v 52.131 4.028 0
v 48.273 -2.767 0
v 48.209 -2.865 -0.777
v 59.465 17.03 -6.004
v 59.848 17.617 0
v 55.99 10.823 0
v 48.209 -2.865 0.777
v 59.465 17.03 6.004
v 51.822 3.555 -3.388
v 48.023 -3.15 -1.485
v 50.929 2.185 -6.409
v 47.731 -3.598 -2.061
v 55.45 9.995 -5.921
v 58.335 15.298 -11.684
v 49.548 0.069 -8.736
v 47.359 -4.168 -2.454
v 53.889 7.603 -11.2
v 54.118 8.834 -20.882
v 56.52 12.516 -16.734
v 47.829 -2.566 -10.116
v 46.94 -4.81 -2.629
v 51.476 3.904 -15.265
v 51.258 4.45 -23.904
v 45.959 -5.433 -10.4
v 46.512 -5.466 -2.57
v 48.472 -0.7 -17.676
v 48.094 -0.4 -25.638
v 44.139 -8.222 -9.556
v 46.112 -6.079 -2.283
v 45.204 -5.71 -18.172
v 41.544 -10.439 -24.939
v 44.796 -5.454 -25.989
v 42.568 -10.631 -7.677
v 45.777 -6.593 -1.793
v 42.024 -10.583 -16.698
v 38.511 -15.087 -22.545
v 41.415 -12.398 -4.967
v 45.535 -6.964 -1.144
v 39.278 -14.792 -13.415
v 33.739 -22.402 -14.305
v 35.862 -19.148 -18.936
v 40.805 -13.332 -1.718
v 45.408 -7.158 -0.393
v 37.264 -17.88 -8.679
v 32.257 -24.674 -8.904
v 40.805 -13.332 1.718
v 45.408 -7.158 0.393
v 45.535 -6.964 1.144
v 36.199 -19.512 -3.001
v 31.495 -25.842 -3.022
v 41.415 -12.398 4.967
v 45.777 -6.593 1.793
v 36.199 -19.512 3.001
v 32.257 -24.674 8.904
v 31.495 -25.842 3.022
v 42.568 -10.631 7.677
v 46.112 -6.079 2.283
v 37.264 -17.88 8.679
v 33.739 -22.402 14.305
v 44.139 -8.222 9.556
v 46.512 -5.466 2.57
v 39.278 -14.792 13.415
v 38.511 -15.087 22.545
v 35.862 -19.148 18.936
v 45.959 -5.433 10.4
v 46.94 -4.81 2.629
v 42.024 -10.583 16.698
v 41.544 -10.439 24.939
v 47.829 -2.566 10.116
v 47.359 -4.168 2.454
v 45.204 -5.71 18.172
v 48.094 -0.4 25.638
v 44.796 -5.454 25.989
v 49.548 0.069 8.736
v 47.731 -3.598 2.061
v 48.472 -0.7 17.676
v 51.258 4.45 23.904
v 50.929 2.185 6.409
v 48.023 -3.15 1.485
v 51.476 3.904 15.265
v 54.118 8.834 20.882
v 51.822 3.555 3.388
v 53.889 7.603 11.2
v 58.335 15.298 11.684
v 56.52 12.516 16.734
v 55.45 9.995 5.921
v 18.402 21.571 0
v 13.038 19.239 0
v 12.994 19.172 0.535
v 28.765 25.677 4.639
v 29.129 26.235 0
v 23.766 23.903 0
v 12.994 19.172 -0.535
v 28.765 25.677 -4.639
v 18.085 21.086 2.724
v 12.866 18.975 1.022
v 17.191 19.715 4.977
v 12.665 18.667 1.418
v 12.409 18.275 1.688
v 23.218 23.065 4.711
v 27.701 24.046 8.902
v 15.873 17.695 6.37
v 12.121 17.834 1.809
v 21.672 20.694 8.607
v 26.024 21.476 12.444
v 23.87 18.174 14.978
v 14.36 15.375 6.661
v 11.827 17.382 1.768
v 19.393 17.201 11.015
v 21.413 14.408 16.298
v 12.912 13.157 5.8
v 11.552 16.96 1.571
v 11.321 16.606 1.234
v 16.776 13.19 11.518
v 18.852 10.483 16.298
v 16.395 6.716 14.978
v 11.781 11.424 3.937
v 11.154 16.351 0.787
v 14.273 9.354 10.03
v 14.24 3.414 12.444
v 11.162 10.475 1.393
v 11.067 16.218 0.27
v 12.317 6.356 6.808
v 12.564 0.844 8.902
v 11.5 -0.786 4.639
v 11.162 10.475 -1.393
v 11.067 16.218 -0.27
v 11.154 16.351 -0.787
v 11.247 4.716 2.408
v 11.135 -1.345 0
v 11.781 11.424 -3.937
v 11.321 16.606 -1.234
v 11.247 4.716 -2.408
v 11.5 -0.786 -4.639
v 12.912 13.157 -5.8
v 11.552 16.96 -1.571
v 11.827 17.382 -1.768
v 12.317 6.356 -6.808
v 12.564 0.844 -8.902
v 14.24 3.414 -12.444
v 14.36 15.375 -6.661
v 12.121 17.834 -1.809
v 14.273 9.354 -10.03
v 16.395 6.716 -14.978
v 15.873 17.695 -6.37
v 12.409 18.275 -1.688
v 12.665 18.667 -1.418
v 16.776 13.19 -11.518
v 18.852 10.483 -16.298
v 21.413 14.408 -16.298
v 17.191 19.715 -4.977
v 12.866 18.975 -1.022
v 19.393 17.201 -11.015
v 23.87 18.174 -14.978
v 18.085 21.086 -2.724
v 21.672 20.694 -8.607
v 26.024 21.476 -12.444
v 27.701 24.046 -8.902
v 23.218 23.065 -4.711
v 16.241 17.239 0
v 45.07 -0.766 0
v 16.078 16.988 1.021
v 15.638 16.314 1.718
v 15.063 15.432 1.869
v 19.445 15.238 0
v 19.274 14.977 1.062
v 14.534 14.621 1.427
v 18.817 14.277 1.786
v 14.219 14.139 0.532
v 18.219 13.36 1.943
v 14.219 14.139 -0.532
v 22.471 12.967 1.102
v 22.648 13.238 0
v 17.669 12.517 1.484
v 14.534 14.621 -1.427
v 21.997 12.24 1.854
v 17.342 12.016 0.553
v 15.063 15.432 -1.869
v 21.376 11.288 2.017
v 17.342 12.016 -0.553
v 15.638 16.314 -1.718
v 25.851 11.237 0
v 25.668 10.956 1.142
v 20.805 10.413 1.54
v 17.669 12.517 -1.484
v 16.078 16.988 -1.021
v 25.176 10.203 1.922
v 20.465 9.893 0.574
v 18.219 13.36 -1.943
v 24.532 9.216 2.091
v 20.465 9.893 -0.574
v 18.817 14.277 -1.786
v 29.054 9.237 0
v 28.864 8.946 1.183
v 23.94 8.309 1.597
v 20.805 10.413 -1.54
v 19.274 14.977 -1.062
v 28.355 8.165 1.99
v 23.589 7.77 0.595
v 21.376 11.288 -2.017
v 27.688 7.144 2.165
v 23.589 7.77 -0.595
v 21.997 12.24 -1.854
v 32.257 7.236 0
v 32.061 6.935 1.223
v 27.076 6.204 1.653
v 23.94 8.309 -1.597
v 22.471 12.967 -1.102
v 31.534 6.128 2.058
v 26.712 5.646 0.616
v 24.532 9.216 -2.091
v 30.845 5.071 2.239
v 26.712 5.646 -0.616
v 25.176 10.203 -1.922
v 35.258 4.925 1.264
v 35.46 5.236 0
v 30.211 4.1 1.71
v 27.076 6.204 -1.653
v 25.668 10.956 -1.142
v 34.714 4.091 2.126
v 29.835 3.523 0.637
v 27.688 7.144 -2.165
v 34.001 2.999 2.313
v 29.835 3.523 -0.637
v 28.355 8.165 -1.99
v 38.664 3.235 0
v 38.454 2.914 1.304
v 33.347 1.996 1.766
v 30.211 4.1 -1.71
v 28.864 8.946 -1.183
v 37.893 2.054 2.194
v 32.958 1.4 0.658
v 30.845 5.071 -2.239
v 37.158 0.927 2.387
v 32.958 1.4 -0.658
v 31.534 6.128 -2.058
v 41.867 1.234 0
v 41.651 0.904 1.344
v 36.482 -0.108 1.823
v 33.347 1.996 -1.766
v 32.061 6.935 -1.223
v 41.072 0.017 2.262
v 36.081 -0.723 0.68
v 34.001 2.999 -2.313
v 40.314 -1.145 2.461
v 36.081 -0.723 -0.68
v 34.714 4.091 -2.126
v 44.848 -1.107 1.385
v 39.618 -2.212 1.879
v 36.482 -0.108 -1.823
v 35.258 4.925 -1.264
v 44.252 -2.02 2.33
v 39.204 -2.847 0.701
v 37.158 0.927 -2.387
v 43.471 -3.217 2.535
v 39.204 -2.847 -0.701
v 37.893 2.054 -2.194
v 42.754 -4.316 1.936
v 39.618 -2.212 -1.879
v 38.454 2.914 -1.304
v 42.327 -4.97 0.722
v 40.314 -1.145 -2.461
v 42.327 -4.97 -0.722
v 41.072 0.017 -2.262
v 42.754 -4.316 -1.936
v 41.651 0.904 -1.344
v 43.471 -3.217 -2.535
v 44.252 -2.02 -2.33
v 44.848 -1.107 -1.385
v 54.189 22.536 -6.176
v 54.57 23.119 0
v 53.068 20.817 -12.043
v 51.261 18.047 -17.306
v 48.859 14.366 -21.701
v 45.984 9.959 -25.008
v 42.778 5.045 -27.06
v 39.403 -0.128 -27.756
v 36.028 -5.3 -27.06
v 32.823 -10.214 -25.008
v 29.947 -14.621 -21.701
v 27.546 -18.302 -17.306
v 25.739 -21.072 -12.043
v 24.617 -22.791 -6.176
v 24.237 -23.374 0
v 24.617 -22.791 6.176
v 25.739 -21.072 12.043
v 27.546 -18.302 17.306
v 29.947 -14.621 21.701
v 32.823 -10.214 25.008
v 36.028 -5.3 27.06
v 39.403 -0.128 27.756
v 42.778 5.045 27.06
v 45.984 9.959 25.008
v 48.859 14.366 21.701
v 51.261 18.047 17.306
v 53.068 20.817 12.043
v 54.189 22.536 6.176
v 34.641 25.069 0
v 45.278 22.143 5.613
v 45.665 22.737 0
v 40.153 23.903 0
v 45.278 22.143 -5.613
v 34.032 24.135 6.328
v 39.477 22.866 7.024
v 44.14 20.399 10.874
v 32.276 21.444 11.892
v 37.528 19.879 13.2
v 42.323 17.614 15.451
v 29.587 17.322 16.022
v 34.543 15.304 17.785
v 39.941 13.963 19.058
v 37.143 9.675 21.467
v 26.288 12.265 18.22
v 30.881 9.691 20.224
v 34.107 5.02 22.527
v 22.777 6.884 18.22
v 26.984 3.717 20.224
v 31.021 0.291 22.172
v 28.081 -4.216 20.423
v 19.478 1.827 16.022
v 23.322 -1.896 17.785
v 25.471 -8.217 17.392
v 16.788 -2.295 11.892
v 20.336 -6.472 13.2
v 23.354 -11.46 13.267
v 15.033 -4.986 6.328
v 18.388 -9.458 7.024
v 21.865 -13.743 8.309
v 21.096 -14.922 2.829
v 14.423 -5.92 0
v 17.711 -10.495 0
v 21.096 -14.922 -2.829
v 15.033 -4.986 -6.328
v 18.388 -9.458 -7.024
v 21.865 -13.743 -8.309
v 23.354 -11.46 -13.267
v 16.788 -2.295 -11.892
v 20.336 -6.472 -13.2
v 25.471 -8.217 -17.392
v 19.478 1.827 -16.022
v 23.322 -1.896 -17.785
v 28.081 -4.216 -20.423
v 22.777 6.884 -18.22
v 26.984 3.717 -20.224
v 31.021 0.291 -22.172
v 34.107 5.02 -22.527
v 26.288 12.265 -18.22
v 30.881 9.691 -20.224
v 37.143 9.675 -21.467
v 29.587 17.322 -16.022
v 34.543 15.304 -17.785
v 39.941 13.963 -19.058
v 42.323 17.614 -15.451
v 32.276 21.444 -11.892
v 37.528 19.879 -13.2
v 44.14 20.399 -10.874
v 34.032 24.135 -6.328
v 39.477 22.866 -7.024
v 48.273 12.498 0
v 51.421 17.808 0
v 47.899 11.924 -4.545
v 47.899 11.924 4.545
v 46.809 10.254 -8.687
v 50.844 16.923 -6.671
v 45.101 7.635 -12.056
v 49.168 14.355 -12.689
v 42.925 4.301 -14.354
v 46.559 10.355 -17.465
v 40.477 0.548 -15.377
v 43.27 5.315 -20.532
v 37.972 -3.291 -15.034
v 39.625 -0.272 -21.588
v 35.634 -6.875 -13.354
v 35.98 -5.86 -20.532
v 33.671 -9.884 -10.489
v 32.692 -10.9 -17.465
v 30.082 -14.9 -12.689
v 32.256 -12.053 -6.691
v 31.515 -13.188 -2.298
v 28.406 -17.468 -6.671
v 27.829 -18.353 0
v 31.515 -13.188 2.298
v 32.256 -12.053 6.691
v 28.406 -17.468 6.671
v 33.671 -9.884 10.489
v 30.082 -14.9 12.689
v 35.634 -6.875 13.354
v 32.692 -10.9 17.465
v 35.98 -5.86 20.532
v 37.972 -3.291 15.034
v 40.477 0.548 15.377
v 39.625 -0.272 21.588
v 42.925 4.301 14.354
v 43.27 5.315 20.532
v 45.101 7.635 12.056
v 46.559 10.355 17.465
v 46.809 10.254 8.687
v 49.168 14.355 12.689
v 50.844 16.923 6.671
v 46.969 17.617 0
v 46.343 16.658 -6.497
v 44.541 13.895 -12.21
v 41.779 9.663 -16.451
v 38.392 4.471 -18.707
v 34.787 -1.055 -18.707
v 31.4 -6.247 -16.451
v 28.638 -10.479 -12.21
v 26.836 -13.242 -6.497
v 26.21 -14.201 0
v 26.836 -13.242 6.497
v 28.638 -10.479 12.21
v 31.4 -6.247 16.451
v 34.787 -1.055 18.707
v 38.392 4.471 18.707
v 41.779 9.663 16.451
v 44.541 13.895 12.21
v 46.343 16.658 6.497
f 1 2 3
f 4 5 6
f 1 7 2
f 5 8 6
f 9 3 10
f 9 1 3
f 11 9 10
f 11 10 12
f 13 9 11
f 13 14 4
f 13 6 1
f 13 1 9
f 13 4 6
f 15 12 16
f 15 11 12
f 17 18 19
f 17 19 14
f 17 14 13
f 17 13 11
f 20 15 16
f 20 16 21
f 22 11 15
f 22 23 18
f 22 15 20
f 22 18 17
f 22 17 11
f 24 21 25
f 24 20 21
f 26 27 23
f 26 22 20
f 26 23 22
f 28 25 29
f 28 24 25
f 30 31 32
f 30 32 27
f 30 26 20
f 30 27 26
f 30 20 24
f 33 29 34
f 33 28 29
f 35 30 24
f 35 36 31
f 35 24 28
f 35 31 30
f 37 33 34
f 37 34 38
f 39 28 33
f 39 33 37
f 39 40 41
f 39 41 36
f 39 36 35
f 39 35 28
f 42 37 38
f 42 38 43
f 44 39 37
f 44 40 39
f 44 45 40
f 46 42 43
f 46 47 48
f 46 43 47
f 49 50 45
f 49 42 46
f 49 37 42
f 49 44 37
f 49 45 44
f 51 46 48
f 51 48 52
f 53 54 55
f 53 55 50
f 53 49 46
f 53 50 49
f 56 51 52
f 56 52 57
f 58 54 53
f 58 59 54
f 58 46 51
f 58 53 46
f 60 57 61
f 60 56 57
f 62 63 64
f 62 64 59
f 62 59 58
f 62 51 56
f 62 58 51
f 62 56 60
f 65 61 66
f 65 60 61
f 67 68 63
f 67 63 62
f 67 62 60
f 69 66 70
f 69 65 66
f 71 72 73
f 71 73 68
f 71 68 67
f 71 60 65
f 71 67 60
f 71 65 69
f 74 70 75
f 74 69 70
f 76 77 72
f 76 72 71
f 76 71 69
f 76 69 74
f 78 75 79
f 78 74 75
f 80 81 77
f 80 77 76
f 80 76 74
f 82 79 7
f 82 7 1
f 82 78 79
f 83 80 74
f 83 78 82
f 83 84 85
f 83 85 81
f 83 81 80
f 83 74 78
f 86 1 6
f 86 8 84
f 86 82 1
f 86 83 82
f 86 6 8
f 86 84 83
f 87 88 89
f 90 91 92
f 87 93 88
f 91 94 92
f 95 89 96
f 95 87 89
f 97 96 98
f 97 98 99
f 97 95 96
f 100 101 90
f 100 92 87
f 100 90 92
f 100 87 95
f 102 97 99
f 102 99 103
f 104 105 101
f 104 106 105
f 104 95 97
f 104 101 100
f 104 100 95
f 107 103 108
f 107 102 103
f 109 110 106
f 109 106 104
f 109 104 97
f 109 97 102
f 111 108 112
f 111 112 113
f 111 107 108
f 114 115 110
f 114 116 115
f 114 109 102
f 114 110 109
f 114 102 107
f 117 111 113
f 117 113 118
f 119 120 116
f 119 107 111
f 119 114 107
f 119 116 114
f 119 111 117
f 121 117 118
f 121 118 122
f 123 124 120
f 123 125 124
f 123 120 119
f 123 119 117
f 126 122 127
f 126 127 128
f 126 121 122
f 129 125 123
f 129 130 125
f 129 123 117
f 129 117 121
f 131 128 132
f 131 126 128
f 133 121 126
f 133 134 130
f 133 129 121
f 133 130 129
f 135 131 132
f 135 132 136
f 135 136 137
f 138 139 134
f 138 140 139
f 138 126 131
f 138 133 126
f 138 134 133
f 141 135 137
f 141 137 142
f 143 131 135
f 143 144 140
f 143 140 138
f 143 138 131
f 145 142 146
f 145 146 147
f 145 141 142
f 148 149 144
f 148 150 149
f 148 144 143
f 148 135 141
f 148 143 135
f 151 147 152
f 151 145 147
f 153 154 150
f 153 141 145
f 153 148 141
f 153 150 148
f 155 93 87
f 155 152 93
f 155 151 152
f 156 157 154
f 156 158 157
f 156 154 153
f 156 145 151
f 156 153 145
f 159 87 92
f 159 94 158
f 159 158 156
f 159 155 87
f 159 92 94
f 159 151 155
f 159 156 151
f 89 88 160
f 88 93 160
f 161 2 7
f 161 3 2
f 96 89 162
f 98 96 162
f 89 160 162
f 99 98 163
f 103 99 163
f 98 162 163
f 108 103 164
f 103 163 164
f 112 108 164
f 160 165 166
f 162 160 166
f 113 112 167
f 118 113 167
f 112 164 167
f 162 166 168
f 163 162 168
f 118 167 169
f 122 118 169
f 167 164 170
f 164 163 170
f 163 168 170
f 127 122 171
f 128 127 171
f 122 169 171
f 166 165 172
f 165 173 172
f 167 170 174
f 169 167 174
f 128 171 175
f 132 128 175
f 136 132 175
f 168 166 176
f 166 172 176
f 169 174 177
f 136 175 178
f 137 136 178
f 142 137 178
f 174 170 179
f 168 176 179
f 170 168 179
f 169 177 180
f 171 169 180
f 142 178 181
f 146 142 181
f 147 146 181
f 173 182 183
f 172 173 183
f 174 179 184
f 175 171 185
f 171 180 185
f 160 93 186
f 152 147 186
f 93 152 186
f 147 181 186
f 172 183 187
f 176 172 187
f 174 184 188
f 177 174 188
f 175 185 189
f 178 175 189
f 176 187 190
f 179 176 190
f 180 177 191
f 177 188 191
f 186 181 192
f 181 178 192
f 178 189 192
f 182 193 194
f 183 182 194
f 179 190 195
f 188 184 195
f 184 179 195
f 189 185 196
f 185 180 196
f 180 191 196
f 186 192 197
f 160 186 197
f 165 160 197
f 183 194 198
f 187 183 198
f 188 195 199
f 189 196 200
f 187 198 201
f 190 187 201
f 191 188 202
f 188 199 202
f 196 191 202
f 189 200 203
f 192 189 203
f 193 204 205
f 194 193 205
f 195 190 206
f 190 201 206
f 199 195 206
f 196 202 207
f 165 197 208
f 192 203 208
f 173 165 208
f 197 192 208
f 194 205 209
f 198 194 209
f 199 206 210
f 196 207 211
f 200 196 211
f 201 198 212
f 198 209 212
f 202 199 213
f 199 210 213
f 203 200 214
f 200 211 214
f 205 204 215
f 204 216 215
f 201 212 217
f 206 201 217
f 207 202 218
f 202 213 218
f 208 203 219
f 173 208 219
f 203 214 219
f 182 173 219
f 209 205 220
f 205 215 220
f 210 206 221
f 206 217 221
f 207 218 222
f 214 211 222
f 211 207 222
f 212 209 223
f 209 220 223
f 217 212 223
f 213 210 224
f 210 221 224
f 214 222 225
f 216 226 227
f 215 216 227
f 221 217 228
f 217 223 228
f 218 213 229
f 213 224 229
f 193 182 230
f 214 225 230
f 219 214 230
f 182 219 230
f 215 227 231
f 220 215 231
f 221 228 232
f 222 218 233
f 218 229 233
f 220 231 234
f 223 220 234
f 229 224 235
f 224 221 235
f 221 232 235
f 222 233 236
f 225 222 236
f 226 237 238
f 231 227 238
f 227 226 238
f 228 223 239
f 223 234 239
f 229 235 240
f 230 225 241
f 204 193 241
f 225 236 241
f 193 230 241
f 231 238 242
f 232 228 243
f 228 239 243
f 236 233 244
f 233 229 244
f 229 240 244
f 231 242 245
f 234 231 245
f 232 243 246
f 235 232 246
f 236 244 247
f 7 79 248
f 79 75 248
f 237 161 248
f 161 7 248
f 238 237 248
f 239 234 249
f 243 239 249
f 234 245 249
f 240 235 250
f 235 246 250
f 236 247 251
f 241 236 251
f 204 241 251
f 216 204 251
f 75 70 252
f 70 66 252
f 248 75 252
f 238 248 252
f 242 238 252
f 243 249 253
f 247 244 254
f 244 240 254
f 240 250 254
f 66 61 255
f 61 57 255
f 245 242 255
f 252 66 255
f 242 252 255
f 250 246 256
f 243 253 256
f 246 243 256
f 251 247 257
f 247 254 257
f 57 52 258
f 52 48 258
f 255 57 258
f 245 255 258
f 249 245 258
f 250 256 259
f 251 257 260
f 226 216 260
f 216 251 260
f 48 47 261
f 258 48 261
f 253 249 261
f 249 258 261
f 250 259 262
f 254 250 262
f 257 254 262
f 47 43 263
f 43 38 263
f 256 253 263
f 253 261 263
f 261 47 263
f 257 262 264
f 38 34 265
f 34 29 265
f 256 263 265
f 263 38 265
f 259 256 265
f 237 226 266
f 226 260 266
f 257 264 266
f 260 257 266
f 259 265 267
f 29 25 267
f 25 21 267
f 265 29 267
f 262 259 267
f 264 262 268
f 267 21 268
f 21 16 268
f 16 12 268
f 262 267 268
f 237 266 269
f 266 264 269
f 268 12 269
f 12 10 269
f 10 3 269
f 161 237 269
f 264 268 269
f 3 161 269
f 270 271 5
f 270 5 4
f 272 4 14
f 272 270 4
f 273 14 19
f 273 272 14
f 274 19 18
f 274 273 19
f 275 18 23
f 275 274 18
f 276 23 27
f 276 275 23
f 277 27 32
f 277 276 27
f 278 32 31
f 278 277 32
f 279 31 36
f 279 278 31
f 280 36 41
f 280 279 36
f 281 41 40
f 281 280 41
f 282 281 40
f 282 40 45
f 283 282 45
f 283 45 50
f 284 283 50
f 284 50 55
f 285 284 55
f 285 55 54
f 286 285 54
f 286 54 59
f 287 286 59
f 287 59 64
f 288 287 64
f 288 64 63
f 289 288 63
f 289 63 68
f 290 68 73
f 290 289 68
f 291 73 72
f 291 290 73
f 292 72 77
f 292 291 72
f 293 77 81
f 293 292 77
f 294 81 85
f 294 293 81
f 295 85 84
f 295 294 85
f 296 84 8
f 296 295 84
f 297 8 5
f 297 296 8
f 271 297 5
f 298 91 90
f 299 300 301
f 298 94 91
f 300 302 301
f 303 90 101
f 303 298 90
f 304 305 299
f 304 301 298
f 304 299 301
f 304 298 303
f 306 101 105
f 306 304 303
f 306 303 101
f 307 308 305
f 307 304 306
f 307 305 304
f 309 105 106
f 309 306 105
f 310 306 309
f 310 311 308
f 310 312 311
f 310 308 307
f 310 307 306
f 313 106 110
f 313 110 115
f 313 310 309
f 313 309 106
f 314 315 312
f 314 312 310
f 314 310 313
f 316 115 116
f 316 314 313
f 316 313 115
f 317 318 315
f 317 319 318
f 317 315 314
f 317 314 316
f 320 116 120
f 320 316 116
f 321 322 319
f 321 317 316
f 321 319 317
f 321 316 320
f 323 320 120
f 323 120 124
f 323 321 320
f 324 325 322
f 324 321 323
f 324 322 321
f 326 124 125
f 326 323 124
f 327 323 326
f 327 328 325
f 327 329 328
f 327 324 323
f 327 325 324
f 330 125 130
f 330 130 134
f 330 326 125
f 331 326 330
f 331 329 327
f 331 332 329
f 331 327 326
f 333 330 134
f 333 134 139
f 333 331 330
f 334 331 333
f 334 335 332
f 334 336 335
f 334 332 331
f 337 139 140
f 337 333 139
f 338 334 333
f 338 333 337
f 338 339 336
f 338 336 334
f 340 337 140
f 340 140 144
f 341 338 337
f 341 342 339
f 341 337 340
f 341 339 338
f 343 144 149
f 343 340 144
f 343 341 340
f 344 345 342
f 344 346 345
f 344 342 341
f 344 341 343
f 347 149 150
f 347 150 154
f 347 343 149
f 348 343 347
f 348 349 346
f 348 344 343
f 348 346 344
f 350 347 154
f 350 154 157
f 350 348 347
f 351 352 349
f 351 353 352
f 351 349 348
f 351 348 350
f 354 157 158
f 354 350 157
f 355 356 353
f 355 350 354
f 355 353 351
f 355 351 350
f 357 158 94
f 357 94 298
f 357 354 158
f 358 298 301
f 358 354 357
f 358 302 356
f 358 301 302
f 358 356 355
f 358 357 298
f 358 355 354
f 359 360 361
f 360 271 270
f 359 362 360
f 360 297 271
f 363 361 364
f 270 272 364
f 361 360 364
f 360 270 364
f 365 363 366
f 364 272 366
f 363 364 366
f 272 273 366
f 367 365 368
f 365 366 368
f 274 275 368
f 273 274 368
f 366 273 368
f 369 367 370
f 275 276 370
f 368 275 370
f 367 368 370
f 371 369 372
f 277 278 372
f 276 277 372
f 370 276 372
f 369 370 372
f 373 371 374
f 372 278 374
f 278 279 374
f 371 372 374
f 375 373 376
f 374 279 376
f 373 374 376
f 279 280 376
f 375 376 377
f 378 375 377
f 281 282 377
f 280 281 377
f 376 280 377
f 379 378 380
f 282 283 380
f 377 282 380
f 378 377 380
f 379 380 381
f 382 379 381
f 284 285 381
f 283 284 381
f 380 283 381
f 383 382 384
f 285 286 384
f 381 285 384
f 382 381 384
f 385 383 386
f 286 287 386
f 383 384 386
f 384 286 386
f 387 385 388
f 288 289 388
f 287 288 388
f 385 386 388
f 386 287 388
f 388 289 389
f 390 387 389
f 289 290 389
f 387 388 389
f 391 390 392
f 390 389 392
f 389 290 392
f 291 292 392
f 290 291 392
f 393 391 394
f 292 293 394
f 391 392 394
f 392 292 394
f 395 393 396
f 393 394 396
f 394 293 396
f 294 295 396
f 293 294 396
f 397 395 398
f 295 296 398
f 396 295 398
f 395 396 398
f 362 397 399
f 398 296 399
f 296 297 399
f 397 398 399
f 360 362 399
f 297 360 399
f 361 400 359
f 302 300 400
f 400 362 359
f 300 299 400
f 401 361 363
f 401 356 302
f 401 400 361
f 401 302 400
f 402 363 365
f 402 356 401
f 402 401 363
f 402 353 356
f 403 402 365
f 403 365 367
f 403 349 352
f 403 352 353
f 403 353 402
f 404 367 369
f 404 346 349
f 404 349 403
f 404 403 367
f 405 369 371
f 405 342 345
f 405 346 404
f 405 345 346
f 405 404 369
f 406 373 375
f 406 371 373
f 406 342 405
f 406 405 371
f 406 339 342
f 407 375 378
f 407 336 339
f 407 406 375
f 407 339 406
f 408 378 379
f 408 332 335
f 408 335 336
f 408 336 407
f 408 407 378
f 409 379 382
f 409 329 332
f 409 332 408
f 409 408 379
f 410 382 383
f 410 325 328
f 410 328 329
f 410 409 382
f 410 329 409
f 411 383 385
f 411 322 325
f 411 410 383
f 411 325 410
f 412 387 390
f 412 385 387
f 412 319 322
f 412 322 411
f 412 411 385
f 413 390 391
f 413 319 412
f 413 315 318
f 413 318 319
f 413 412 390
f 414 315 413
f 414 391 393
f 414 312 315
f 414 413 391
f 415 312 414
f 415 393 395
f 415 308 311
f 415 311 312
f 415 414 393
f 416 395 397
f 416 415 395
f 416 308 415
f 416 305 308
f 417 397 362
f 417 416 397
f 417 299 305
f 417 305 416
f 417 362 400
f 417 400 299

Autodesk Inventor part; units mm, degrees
ref_plane "YZ Plane" through (0, 0, 0) normal (1, 0, 0) x (0, 1, 0)
ref_plane "XZ Plane" through (0, 0, 0) normal (0, 1, 0) x (-1, 0, 0)
ref_plane "XY Plane" through (0, 0, 0) normal (0, 0, 1) x (1, 0, 0)
sketch "Sketch1" plane through (0, 0, 0) normal (0, 0, 1) x (1, 0, 0)
  line L0 (13.0382, 19.2392) -> (29.1292, 26.2353)
  line L1 (29.1292, 26.2353) -> (45.6654, 22.7373)
  line L2 (45.6654, 22.7373) -> (48.273, 12.4976)
  line L3 (48.273, 12.4976) -> (54.5695, 23.1189)
  line L4 (54.5695, 23.1189) -> (59.8483, 17.6174)
  line L5 (59.8483, 17.6174) -> (48.273, -2.7666)
  line L6 (48.273, -2.7666) -> (13.0382, 19.2392)
  line L7 (11.0461, 18.3731) -> (46.9692, -5.0626) construction
  point P0 (0, 0)
revolve "Revolution1" add sketch "Sketch1" angle 360 about axis through (11.0461, 18.3731, 0) along (0.8375, -0.5464, 0)
